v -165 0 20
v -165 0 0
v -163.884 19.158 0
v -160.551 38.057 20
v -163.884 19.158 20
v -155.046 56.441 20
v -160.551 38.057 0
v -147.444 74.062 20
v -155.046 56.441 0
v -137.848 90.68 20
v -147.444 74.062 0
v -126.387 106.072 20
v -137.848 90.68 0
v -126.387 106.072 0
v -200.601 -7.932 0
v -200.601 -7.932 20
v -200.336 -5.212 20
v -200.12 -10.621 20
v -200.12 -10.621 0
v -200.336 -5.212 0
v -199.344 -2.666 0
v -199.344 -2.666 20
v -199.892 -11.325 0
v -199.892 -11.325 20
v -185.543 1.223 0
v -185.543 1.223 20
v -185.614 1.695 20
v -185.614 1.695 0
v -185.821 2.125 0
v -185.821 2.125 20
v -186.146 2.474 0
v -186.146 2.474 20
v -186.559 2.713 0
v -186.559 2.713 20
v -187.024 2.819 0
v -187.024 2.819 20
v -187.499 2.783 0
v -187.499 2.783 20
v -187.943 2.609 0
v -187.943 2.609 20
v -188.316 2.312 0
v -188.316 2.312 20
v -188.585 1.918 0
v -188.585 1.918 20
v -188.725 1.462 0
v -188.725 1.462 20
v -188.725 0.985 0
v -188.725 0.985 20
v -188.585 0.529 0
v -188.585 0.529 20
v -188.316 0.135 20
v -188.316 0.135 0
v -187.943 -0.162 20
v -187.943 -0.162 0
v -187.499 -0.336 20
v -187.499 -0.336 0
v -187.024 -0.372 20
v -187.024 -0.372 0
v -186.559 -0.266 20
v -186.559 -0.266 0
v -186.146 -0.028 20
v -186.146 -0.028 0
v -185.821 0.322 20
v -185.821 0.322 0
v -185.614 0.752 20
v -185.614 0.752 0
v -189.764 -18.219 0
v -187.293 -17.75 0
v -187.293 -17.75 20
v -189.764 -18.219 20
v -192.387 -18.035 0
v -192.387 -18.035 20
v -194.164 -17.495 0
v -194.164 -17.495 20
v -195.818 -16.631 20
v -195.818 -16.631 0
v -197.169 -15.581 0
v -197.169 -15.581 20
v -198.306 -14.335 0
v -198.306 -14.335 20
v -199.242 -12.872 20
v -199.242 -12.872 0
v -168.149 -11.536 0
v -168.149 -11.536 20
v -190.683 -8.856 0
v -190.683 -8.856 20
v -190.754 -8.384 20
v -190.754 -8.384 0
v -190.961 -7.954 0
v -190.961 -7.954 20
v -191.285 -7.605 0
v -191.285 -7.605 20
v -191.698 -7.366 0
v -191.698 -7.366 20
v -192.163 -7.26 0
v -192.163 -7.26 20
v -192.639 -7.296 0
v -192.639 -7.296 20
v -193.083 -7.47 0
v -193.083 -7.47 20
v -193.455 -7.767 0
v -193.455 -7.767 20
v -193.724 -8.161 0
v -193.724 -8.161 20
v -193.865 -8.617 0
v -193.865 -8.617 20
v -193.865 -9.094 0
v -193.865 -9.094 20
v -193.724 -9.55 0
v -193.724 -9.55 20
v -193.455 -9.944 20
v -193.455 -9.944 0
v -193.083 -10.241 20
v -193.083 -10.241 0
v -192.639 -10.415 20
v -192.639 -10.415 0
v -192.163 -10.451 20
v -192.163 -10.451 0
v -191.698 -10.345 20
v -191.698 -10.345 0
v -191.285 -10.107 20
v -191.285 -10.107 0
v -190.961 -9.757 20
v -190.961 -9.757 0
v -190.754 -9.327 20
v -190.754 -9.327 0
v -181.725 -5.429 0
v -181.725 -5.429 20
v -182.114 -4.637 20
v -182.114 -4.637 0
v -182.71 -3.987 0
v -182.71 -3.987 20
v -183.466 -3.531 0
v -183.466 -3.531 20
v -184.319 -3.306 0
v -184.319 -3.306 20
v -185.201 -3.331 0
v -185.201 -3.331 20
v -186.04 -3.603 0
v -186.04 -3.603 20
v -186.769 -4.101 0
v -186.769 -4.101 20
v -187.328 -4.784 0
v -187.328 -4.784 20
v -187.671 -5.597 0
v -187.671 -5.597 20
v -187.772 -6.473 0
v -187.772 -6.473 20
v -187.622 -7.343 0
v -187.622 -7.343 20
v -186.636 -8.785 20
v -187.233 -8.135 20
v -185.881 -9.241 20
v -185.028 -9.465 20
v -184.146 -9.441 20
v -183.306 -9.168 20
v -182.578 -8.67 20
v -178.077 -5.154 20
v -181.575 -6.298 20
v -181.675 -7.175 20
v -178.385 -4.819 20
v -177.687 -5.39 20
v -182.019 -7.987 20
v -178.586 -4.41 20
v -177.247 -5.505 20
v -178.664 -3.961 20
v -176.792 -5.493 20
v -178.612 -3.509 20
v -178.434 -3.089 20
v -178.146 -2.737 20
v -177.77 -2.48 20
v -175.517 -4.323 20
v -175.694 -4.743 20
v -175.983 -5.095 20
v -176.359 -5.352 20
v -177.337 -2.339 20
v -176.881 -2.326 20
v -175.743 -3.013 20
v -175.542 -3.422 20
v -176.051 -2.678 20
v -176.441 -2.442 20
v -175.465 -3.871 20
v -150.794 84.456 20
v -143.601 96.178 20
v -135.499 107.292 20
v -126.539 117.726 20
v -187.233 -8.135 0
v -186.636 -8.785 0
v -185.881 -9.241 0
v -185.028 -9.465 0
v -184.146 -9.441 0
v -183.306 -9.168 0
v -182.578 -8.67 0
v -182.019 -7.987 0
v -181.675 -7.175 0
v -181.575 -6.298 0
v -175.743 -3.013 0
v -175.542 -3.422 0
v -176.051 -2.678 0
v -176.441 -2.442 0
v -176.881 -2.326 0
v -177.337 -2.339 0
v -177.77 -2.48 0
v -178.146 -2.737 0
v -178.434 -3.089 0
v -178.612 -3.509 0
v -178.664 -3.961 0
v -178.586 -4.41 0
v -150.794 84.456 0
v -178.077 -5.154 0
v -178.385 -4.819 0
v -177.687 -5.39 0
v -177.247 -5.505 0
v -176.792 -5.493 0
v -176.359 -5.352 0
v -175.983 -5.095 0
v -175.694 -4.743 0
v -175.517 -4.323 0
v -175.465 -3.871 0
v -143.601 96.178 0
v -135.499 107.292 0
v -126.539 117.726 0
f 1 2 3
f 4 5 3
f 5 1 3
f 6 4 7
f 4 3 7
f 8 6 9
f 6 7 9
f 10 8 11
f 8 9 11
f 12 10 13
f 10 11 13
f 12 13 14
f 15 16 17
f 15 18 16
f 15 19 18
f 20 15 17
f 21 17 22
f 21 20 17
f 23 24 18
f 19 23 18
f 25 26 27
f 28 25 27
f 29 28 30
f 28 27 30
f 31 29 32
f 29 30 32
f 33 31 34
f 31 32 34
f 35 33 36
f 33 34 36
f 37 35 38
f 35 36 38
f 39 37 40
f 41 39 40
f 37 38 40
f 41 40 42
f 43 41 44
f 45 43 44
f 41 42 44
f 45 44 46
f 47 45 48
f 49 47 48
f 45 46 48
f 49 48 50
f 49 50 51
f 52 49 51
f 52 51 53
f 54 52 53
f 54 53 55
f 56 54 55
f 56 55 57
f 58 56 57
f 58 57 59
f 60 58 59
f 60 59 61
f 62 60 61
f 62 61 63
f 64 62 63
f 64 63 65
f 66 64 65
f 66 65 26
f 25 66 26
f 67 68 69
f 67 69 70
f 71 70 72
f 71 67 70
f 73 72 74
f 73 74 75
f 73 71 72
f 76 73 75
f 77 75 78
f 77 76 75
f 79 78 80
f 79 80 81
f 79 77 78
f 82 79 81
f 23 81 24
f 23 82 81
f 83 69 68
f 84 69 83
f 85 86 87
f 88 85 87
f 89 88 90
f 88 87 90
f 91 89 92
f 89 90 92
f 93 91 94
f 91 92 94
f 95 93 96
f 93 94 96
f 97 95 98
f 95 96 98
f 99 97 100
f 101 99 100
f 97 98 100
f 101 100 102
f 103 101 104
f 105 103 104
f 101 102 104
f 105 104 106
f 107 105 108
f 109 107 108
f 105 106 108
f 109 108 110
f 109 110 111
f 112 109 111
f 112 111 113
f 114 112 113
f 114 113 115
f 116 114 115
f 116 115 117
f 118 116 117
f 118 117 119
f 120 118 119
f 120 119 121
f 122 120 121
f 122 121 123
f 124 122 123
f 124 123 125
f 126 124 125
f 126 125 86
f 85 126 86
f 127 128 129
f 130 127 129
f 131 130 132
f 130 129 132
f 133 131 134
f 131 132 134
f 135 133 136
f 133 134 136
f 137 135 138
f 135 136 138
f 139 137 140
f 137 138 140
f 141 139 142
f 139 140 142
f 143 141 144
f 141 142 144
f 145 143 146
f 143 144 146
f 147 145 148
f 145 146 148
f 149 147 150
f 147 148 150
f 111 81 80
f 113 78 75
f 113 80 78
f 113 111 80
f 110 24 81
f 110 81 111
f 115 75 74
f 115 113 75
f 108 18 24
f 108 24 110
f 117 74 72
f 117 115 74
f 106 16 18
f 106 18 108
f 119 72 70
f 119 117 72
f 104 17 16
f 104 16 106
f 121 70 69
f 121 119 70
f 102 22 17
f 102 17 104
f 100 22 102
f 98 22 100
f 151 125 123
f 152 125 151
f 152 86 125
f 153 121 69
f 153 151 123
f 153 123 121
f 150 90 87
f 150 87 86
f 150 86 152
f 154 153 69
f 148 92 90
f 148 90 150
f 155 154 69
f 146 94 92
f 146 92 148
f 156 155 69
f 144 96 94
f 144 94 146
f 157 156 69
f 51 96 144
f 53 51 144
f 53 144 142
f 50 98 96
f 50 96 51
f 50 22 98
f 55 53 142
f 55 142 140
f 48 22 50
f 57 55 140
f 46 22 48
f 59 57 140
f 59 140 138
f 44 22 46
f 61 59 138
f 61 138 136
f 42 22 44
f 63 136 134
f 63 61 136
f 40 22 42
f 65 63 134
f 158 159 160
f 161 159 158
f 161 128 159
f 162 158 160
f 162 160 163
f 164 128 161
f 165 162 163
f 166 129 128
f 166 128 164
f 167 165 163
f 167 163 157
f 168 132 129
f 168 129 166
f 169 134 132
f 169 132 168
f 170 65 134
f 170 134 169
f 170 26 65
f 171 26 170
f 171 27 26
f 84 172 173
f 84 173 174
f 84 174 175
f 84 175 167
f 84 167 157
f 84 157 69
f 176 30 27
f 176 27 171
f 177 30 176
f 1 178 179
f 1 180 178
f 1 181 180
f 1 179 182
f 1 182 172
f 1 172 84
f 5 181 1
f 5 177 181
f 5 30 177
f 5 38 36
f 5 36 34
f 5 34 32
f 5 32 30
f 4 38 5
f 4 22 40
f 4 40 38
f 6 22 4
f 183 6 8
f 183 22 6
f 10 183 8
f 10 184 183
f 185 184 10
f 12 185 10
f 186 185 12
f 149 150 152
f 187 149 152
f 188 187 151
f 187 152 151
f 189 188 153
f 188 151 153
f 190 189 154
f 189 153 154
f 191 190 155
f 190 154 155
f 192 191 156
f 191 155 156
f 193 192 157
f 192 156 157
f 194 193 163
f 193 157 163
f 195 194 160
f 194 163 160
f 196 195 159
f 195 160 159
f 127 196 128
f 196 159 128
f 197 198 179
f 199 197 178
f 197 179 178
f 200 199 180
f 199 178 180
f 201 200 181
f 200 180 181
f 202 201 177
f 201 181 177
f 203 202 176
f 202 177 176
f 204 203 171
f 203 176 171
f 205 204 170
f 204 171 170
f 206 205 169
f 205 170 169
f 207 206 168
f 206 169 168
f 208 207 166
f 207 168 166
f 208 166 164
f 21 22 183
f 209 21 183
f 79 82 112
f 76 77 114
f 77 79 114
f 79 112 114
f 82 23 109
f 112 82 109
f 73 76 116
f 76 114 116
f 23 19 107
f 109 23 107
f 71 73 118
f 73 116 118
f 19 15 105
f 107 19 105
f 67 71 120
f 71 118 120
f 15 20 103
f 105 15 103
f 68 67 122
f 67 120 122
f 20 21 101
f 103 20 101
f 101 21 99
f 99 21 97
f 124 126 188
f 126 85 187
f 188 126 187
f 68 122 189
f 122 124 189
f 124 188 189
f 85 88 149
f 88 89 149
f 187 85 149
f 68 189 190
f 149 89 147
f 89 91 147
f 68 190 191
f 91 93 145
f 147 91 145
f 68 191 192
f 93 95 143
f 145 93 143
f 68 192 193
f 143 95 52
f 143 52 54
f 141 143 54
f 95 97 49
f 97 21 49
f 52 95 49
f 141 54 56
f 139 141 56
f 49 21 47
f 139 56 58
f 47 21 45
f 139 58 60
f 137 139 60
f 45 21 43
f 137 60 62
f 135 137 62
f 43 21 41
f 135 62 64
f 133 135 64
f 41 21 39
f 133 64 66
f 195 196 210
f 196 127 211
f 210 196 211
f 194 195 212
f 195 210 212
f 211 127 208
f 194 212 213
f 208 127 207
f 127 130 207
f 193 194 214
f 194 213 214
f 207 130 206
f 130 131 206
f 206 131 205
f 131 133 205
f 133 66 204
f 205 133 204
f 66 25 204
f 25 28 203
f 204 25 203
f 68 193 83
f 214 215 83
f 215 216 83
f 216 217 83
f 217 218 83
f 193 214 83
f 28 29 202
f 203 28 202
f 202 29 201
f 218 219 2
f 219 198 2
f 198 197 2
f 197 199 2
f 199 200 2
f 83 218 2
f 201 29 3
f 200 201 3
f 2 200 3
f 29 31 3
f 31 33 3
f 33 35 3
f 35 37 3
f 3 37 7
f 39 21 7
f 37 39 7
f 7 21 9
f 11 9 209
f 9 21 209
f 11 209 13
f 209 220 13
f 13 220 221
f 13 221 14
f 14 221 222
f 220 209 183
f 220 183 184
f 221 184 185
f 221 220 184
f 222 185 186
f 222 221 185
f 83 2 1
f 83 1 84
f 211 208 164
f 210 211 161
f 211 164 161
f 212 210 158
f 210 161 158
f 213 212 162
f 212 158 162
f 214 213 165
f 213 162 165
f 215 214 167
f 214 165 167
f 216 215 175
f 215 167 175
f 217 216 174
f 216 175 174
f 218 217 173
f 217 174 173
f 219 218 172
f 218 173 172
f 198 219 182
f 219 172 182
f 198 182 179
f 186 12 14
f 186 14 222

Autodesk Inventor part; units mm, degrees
ref_plane "YZ Plane" through (0, 0, 0) normal (1, 0, 0) x (0, 1, 0)
ref_plane "XZ Plane" through (0, 0, 0) normal (0, 1, 0) x (-1, 0, 0)
ref_plane "XY Plane" through (0, 0, 0) normal (0, 0, 1) x (1, 0, 0)
sketch "Эскиз1" plane through (0, 0, 0) normal (0, 0, 1) x (1, 0, 0)
  circle A0 centre (0, 0) radius 165
  circle A1 centre (0, 0) radius 172.834
  line L0 (-125, 0) -> (-126.5392, 117.7261)
  line L1 (-132.7592, 119.5177) -> (-197.8467, 76.6552)
  line L2 (-165, 0) -> (-153, 0) construction
  line L3 (-134.7038, 9.8338) -> (-172.765, -2.5204) projected
  line L4 (-165, 0) -> (-172.8154, -2.5368)
  point P0 (-172.834, 0)
  point P1 (-126.3868, 106.0725)
  point P2 (-123, 114.4334)
  point P3 (-172.8149, -2.5694)
  dimension "d0" = 330
  dimension "d1" = 345.668
  dimension "d2" = 40
extrude "Выдавливание1" add sketch "Эскиз1" along normal blind 20 contours L3 L4 A1 L0 A0 picked at (-133.2989, 101.385)
sketch "Эскиз2" plane through (0, 0, 0) normal (0, 0, -1) x (-1, 0, 0)
  arc A0 (172.8154, -2.5368) -> (126.5392, 117.7261) centre (0, 0) ccw projected
  arc A1 (165, 0) -> (126.3868, 106.0725) centre (0, 0) ccw projected
  circle A2 centre (0, 0) radius 168.917
  line L0 (172.8154, -2.5368) -> (165, 0) projected
  circle A3 centre (184.6734, -6.3858) radius 2.1
  line L1 (178.0154, -4.2246) -> (172.8154, -2.5368)
  line L2 (160.1198, 6.946) -> (198.8648, -5.6302)
  line L3 (182.8662, -5.7992) -> (187.0032, 6.946)
  line L4 (178.0154, -4.2246) -> (198.192, -10.7737)
  line L5 (184.6734, -6.3858) -> (189.5243, -7.9603)
  line L6 (189.5243, -7.9603) -> (192.7095, 1.8528)
  point P0 (184.4408, -0.9483)
  point P1 (172.8109, 2.8266)
  point P2 (176.018, -3.5763)
  point P3 (182.676, -5.7374)
  point P4 (183.1424, -4.9484)
  point P5 (164.9119, 5.3905)
  point P6 (186.6708, -7.0341)
  point P7 (191.0988, -3.1094)
  dimension "d8" = 337.834
  dimension "d11" = 4.2
  dimension "d18" = 5.1
extrude "Выдавливание2" add sketch "Эскиз2" against normal up to surface (20 mm away) contours L0 A2 L2 A0 | A0 L2 L3 A3 L4 L1 | L0 A1 L2 A2 | L2 L6 L4 A3 L3 picked at (166.282, 2.7097)
sketch "Эскиз3" plane through (0, 0, 20) normal (0, 0, 1) x (1, 0, 0)
  arc A0 (-126.3868, 106.0725) -> (-165, 0) centre (0, 0) ccw projected
  line L0 (-126.3868, 106.0725) -> (-126.5392, 117.7261) projected
  arc A1 (-126.5392, 117.7261) -> (-172.8109, 2.8266) centre (0, 0) ccw projected
  line L1 (-191.0988, -3.1094) -> (-172.8109, 2.8266) projected
  line L2 (-189.5243, -7.9603) -> (-191.0988, -3.1094) projected
  line L3 (-186.6708, -7.0341) -> (-189.5243, -7.9603) projected
  arc A2 (-182.676, -5.7374) -> (-186.6708, -7.0341) centre (-184.6734, -6.3858) ccw projected
  line L4 (-165, 0) -> (-182.676, -5.7374) projected
  circle A3 centre (-184.6734, -6.3858) radius 3.1
  arc A4 (-126.5392, 117.7261) -> (-172.8109, 2.8266) centre (0, 0) ccw projected
  line L5 (-184.6734, -6.3858) -> (-194.1849, -9.4731)
  line L6 (-194.1849, -9.4731) -> (-195.7594, -4.6222)
  line L7 (-195.7594, -4.6222) -> (-191.0988, -3.1094)
  circle A5 centre (-184.6734, -6.3858) radius 11
  circle A6 centre (-184.6734, -6.3858) radius 9.5
  circle A7 centre (-184.6734, -6.3858) radius 6.5
  line L8 (-190.8559, -8.3925) -> (-193.7093, -9.3187)
  circle A8 centre (-192.2826, -8.8556) radius 1.6
  circle A9 centre (-182.2036, -13.995) radius 1.6
  circle A10 centre (-177.0642, -3.9159) radius 1.6
  circle A11 centre (-187.1433, 1.2234) radius 1.6
  line L9 (-192.2826, -8.8556) -> (-199.8918, -11.3255)
  line L10 (-199.8918, -11.3255) -> (-201.4663, -6.4746)
  line L11 (-201.4663, -6.4746) -> (-191.0988, -3.1094)
  line L12 (-201.4663, -6.4746) -> (-195.8644, -23.7333)
  line L13 (-172.8109, 2.8266) -> (-166.0857, -17.8924)
  line L14 (-184.6734, -6.3858) -> (-181.5861, -15.8973)
  line L15 (-165, 0) -> (-182.676, -5.7374) projected
  line L16 (-209.847, -25.0704) -> (-154.8396, -7.2156)
  line L17 (-201.4663, -6.4746) -> (-150.7943, 84.4559)
  line L18 (-165, 0) -> (-168.149, -11.5357)
  point P0 (-182.1957, -12.395)
  point P1 (-183.1496, -12.7046)
  point P2 (-195.5181, -4.5439)
  point P3 (-195.5997, -5.1144)
  point P4 (-193.5037, -9.8895)
  point P5 (-175.4687, -4.0356)
  point P6 (-178.5861, -4.4099)
  point P7 (-181.7249, -5.4287)
  point P8 (-187.622, -7.3428)
  point P9 (-150.9747, 84.1323)
  point P10 (-193.8045, -9.3496)
  point P11 (-196.8045, -20.837)
  point P12 (-168.149, -11.5357)
  point P13 (-171.2364, -2.0242)
  point P14 (-175.5424, -3.4219)
  point P15 (-181.1697, -15.216)
  point P16 (-182.3233, -15.5905)
  dimension "d22" = 19
  dimension "d23" = 13
  dimension "d19" = 6.2
  dimension "d20" = 10
  dimension "d21" = 22
  dimension "d24" = 3.2
  dimension "d27" = 360
  dimension "d29" = 8
  dimension "d30" = 10
  dimension "d33" = 10
extrude "Выдавливание3" add sketch "Эскиз3" against normal up to surface (20 mm away) contours A1 L1 A5 L7 L11 L17 | L11 L6 A5 L9 L10 | L1 A6 A11 L7 A5 | L13 L16 A5 L4 | L4 L18 L13 | L9 A5 L16 L12 | L7 A5 L6 | L1 A7 A11 A6 | A5 L16 L14 A9 A6 A10 L4 | L7 A6 A8 L5 L6 A5 | L9 L5 A8 A6 A9 L14 L16 A5 | A5 L6 L9 | L1 A7 A11 | A6 A11 A7 L1 L7 | L7 L2 A7 A8 A6 | L2 L5 A8 A7 | A10 A7 A9 L14 A3 L4 | A6 A9 A7 A10 | L14 A6 A9 | A9 A6 L14 | A8 A7 A9 A6 | L3 A3 L14 A9 A7 A8 L5 | A9 A7 L14 A6 | A6 L14 A7 A9 | A9 L14 A7 | L14 A9 A7
sketch "Эскиз4" plane through (0, 0, 20) normal (0, 0, 1) x (1, 0, 0)
  arc A0 (-187.622, -7.3428) -> (-181.7249, -5.4287) centre (-184.6734, -6.3858) ccw projected
  arc A1 (-178.5861, -4.4099) -> (-175.5424, -3.4219) centre (-177.0642, -3.9159) ccw projected
  circle A2 centre (-184.6734, -6.3858) radius 3.1
  circle A3 centre (-177.0642, -3.9159) radius 1.6
  point P0 (0, 0)
  point P1 (-175.5424, -3.4219)
  point P2 (-178.5861, -4.4099)
  point P3 (-181.7249, -5.4287)
  point P4 (-187.622, -7.3428)
extrude "Выдавливание4" cut sketch "Эскиз4" against normal through all
fillet "Сопряжение2" radius 10 2 edges at (-201.4663, -6.4746, 10) (-196.8045, -20.837, 10)
sketch "Эскиз5" plane through (0, 0, 20) normal (0, 0, 1) x (1, 0, 0)
  circle A0 centre (-177.0642, -3.9159) radius 1.6 projected
  circle A1 centre (-192.2826, -8.8556) radius 1.6 projected
  circle A2 centre (-187.1433, 1.2234) radius 1.6 projected
  circle A3 centre (-184.6734, -6.3858) radius 3.1 projected
  point P0 (0, 0)
properties part number "направление"
